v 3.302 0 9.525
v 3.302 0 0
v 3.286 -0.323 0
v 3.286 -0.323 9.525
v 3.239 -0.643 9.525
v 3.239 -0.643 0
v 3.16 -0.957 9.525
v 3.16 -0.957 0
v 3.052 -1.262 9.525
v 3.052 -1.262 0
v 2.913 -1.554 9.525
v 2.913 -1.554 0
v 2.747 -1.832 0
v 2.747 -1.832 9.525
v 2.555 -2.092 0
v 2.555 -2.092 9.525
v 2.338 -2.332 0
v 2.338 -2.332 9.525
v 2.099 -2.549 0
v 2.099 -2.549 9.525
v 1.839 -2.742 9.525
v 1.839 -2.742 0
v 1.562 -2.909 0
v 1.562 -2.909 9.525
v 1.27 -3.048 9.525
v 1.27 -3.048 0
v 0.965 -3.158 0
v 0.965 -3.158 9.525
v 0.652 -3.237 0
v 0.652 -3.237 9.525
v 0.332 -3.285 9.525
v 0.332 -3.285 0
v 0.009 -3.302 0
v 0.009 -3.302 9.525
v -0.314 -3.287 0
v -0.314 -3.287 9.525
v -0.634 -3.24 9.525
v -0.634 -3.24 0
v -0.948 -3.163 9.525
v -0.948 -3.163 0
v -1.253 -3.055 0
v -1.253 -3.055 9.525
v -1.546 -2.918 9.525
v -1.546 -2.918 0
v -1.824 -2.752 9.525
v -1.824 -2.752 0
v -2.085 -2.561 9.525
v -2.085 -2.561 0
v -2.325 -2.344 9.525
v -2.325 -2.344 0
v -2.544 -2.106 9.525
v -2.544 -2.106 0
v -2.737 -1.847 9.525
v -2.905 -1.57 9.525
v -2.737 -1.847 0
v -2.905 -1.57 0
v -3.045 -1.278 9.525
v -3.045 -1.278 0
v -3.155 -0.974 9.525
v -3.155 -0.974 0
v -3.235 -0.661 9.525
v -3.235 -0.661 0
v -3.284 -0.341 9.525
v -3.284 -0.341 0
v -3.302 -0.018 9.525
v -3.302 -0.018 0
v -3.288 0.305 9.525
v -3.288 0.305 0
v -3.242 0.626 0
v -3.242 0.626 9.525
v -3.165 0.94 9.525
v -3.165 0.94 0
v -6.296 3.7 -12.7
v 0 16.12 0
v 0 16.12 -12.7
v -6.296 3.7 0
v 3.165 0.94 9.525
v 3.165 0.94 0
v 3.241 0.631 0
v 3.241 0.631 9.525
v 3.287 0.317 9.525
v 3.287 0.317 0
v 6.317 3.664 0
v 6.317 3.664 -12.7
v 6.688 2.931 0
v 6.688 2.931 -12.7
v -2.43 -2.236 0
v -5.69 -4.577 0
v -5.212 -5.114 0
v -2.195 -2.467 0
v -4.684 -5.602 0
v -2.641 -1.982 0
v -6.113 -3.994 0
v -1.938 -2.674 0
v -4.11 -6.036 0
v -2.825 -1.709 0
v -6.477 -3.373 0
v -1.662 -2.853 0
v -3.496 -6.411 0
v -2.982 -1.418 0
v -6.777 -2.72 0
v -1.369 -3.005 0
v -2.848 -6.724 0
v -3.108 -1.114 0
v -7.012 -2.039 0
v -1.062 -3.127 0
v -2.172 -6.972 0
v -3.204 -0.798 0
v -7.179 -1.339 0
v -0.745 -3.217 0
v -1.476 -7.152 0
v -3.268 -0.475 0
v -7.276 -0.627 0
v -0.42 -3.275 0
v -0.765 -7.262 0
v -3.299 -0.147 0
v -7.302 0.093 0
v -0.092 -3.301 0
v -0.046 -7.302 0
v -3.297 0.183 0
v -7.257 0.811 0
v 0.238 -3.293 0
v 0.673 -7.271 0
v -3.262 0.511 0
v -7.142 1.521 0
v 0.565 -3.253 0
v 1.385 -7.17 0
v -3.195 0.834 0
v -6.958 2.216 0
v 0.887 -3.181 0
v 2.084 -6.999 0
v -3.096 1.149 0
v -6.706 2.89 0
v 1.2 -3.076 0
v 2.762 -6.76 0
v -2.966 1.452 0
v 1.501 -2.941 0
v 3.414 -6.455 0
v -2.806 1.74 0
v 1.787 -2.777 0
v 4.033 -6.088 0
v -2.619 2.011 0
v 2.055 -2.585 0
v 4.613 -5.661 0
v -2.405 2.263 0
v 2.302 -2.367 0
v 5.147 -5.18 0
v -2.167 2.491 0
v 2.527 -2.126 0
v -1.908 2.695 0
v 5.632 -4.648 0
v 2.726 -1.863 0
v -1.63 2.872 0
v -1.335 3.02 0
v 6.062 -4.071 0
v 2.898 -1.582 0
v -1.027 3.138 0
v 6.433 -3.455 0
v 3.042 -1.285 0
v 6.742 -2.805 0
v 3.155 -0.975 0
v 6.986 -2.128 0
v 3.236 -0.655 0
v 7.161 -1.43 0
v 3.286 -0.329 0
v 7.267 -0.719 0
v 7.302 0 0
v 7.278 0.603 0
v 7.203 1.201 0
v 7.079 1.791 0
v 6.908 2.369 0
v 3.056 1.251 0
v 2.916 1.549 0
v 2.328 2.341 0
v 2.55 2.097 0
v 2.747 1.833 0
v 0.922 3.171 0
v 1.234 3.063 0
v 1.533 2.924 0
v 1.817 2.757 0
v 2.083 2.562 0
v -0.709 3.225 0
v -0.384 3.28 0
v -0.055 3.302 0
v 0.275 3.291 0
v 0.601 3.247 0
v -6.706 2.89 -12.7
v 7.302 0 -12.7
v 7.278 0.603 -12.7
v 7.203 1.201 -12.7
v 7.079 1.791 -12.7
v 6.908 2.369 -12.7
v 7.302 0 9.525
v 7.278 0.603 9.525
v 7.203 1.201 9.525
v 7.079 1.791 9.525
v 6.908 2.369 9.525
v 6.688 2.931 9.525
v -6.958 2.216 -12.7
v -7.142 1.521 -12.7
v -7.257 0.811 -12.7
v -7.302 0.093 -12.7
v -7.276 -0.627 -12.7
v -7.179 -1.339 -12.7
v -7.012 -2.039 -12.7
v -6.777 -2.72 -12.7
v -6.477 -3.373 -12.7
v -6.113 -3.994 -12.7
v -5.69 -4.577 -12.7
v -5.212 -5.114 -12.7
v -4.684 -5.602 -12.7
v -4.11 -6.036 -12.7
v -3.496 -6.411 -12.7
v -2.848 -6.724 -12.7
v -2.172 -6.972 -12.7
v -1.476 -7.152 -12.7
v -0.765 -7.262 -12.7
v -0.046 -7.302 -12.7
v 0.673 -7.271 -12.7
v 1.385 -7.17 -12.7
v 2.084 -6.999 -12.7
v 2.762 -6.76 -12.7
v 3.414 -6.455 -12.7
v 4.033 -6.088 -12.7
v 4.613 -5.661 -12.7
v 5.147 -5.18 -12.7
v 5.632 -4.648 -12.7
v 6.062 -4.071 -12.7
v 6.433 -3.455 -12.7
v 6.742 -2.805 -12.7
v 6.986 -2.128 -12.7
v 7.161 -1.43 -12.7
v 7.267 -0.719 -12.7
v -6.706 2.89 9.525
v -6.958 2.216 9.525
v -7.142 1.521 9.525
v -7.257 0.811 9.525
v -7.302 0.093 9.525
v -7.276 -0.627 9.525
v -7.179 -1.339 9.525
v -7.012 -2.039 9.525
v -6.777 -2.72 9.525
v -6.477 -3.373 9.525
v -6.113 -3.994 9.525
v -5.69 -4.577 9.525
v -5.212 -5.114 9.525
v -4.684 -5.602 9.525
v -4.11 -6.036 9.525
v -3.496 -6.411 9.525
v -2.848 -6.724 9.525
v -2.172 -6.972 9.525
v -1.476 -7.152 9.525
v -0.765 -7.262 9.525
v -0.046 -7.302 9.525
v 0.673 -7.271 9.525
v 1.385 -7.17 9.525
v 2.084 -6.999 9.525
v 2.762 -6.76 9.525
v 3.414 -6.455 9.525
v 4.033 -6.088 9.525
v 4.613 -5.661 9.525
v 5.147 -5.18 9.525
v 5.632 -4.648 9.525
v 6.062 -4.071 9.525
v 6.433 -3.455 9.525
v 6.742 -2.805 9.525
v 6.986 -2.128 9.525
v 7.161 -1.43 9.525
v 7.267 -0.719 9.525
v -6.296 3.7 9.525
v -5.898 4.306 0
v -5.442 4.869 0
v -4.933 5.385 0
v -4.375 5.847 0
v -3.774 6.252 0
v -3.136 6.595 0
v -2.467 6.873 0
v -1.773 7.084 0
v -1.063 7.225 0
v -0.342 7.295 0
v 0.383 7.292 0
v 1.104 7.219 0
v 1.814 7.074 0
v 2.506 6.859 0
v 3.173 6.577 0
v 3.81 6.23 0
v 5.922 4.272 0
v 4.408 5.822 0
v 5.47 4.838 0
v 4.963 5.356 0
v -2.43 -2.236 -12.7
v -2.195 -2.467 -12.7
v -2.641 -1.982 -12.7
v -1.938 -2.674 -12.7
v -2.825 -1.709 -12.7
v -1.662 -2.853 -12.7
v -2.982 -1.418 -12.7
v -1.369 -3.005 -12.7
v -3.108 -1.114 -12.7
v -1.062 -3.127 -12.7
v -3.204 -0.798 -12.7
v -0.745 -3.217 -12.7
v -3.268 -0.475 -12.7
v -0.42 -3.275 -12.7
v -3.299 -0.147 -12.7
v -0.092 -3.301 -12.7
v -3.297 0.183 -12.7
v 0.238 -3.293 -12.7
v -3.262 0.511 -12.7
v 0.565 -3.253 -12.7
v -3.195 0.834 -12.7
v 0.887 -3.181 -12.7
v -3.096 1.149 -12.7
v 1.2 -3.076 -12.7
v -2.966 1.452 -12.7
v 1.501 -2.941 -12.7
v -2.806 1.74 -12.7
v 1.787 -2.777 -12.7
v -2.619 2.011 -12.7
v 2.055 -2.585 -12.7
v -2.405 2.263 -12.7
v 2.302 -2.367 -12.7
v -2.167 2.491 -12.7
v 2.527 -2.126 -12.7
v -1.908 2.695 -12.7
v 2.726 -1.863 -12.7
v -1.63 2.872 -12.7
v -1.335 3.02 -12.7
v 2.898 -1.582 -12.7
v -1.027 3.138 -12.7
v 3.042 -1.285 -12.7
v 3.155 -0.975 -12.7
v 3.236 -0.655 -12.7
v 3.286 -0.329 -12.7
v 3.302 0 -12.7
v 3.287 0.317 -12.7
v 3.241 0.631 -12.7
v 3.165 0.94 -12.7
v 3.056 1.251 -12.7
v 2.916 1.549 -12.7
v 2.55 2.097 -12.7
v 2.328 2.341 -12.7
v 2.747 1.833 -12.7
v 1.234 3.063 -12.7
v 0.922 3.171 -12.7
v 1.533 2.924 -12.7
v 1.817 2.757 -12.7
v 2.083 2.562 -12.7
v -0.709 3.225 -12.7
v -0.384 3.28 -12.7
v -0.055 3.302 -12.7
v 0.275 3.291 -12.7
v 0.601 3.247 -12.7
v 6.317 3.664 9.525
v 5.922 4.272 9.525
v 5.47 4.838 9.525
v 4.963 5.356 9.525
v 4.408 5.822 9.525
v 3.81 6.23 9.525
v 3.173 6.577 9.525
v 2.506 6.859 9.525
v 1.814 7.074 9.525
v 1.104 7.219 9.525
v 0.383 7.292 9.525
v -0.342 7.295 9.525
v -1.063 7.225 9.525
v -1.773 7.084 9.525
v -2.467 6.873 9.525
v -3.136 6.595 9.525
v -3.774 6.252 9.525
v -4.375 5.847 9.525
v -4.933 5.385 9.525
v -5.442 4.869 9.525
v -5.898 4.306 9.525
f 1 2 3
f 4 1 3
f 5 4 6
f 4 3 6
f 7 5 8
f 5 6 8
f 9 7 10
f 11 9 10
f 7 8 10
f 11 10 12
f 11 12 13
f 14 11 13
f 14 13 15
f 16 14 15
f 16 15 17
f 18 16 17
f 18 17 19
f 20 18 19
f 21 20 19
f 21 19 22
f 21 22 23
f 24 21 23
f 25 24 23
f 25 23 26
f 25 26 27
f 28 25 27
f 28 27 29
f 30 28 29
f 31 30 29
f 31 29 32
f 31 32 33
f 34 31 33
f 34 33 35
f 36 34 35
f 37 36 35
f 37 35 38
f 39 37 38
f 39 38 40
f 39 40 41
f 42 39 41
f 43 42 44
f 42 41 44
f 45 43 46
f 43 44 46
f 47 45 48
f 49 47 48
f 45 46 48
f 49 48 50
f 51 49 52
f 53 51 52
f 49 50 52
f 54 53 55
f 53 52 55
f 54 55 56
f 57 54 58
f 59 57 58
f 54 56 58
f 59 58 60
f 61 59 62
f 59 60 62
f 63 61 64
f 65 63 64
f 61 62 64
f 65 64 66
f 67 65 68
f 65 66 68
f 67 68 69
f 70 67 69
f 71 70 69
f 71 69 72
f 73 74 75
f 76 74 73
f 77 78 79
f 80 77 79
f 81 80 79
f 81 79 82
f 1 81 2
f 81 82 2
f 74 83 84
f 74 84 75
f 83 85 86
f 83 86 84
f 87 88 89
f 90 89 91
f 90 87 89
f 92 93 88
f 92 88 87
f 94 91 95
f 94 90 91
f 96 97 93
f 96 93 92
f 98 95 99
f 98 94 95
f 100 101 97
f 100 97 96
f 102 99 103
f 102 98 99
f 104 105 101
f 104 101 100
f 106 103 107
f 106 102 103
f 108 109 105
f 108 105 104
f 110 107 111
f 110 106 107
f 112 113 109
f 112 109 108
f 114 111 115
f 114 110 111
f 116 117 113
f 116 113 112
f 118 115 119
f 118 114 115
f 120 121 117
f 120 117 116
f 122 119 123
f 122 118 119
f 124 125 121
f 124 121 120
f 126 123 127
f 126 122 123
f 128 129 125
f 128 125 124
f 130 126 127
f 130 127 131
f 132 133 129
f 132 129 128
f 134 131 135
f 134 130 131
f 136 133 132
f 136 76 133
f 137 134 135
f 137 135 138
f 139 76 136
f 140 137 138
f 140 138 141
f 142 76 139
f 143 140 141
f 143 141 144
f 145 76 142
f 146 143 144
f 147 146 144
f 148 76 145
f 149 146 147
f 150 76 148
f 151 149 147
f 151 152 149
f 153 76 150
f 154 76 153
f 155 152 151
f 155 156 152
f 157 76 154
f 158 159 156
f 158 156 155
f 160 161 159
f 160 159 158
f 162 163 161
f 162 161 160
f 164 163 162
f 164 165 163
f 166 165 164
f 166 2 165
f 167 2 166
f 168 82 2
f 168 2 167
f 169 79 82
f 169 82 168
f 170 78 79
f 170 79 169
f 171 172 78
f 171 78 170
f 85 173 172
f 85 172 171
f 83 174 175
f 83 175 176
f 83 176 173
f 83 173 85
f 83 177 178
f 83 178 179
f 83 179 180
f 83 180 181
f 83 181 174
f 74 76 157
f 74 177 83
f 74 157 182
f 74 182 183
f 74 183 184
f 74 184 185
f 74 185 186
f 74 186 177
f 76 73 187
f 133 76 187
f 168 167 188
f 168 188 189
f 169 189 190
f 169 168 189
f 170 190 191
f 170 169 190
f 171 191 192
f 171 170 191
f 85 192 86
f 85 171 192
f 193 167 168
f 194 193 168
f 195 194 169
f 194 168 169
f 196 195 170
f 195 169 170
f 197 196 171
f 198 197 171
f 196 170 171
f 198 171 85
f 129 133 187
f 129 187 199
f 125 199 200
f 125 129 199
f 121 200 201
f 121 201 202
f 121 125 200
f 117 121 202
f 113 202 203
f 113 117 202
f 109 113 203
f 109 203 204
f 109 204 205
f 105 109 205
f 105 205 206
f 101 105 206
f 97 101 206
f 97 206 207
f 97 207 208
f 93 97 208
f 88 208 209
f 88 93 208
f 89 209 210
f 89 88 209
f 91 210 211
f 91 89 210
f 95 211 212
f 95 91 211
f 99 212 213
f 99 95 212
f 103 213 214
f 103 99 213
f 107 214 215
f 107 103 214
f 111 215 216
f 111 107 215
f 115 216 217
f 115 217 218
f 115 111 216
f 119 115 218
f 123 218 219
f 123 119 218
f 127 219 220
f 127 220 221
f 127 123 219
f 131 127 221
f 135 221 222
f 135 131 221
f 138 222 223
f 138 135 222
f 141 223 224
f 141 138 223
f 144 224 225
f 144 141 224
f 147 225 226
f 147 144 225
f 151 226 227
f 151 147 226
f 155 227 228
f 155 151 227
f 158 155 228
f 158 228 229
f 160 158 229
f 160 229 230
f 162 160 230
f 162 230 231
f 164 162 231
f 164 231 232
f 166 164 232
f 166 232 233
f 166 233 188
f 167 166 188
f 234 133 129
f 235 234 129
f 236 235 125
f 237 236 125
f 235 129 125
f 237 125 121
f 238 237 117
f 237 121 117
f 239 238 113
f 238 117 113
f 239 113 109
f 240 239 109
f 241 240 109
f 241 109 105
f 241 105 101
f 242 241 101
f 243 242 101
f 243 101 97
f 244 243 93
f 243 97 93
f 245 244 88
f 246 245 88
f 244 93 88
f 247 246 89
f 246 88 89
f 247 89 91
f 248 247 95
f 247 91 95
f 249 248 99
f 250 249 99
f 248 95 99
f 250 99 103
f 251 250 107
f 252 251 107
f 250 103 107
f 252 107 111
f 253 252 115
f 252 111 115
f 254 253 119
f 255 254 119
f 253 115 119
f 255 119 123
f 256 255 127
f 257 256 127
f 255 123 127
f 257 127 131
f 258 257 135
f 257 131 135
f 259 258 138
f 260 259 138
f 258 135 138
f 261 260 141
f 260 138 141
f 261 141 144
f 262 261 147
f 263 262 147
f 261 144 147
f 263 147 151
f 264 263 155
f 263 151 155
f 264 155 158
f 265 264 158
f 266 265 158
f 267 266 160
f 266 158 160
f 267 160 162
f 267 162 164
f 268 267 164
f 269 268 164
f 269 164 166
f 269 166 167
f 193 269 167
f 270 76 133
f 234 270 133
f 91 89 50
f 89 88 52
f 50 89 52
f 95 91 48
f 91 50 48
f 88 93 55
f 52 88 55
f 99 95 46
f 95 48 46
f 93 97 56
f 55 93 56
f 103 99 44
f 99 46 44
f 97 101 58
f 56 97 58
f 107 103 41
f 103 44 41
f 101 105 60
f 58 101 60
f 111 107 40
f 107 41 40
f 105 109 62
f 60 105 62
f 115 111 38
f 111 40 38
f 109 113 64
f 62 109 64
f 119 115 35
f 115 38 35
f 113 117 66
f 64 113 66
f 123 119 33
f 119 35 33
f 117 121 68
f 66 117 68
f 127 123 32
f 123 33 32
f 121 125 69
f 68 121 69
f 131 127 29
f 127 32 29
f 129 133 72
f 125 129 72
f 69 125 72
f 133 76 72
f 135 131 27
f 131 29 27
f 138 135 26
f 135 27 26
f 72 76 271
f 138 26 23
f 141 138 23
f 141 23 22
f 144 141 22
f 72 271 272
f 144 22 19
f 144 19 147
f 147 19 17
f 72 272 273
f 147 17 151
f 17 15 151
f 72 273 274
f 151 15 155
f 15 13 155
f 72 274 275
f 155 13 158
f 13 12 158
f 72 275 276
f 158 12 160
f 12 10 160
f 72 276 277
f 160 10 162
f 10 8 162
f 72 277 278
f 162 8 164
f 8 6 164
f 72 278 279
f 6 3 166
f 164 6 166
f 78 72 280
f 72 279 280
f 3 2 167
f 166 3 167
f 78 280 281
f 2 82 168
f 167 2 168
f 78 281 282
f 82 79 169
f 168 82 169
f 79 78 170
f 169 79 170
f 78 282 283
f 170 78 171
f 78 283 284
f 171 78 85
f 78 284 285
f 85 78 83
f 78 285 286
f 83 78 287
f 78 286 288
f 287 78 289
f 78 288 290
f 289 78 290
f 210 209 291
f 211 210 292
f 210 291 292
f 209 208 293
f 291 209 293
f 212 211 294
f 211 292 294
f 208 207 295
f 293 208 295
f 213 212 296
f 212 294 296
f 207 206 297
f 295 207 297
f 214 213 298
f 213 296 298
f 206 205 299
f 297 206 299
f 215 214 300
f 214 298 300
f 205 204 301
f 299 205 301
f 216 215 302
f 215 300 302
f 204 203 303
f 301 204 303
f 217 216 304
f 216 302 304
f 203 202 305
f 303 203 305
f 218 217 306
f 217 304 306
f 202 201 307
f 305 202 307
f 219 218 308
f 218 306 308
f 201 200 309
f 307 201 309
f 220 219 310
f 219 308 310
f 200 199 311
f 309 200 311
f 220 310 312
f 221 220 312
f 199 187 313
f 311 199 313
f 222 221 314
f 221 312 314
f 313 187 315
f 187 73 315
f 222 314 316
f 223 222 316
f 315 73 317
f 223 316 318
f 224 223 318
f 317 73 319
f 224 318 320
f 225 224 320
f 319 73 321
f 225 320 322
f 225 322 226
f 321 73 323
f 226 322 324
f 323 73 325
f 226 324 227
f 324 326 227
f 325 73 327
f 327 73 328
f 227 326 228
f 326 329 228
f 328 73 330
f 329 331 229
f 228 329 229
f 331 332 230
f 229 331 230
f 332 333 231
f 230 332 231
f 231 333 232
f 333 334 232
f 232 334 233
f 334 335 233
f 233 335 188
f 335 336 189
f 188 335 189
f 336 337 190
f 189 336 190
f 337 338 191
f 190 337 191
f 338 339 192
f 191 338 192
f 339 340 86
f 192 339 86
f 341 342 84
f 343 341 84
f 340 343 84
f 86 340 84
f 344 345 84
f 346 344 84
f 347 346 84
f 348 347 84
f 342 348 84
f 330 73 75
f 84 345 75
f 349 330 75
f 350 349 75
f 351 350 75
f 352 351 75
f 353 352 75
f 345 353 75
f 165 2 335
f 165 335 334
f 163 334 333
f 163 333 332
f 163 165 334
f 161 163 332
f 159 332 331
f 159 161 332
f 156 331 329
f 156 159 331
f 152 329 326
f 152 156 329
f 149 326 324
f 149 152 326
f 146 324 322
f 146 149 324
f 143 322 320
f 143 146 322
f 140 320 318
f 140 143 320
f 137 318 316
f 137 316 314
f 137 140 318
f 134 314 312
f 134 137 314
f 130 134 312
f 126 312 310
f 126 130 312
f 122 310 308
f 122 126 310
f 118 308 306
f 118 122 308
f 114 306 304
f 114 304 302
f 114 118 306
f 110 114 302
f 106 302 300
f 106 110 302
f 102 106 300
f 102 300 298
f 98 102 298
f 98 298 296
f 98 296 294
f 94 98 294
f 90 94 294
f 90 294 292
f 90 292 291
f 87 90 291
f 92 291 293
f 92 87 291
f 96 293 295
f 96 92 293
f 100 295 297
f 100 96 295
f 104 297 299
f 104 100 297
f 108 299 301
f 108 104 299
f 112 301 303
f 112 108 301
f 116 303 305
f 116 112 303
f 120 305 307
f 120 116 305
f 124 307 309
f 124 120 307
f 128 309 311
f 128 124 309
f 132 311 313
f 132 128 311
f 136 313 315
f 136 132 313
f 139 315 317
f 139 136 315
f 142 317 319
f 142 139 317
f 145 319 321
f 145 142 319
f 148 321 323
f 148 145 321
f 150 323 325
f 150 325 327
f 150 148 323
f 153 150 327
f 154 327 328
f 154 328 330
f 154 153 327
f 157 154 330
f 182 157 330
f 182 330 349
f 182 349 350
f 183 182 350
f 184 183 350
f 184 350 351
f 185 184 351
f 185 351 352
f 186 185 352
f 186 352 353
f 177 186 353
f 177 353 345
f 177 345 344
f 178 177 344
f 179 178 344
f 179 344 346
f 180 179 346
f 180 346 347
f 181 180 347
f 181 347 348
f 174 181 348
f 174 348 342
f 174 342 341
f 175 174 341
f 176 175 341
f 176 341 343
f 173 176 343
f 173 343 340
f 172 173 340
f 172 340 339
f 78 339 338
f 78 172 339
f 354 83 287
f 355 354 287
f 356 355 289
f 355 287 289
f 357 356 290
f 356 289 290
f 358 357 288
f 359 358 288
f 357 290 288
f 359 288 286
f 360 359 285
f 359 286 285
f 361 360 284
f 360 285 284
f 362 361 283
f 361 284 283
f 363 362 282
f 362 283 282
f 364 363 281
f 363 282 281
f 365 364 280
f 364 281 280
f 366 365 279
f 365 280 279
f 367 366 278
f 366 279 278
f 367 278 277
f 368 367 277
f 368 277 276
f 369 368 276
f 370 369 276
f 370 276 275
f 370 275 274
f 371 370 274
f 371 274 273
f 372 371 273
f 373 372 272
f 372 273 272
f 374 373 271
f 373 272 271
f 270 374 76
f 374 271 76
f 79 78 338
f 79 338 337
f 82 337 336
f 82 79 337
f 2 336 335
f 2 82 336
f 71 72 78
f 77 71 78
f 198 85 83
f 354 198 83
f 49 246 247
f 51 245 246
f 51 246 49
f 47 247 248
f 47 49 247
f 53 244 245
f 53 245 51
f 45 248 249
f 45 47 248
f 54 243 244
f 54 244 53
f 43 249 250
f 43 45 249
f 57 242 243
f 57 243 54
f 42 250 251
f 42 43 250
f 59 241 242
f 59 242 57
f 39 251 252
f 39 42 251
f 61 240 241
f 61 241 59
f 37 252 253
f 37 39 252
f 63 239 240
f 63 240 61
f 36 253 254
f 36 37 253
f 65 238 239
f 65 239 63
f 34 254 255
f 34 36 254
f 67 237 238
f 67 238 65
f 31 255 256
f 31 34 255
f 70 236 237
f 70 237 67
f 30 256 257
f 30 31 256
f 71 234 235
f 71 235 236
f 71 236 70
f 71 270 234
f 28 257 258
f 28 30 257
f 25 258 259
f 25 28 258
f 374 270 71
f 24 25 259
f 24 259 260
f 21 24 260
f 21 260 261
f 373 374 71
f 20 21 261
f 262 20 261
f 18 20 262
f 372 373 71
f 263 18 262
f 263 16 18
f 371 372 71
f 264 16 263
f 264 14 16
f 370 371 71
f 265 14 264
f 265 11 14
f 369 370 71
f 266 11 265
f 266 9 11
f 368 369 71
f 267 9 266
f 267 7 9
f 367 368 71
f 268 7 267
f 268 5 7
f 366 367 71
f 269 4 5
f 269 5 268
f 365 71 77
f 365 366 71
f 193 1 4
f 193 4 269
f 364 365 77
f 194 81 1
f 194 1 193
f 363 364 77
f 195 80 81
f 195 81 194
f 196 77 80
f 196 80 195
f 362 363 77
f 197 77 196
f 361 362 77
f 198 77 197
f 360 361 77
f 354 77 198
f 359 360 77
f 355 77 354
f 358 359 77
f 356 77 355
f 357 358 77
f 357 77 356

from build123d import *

# Parameters (mm, degrees)
F1_DEPTH = 9.525
F2_DEPTH = 12.7
F3_DEPTH = 9.525


# Not quite as in the source:
# - a feature names something its author has since deleted; it is built from what else it names
# - the program builds the solid bodies; features that only make, move or delete a surface that nothing else refers to are left out


with BuildPart() as f1:
    # F0 (on Top) → F1 (new body)
    with BuildSketch(Plane.XY):
        with BuildLine():
            ThreePointArc((-6.7061053414, 2.890442423), (-1.4756645952, -7.1518473315), (7.3025, 0))
            ThreePointArc((7.3025, 0), (7.1473488528, 1.4973011139), (6.6884881888, 2.9309779936))
            Line((6.6884881888, 2.9309779936), (6.3166219962, 3.6642588347))
            ThreePointArc((6.3166219962, 3.6642588347), (0.0208084361, 7.3024703532), (-6.2956369305, 3.7001975474))
            Line((-6.2956369305, 3.7001975474), (-6.7061053414, 2.890442423))
        make_face()
        with BuildLine():
            ThreePointArc((3.1654351928, 0.9398), (3.2676804469, 0.474835231), (3.302, 0))
            ThreePointArc((3.302, 0), (-0.474835231, -3.2676804469), (-3.1654351928, 0.9398))
            ThreePointArc((-3.1654351928, 0.9398), (0, 3.302), (3.1654351928, 0.9398))
        make_face(mode=Mode.SUBTRACT)
    extrude(amount=F1_DEPTH)

    # F0 (on Top) → F3 (join, through all)
    with BuildSketch(Plane.XY):
        with BuildLine():
            Line((-3.1654351928, 0.9398), (3.1654351928, 0.9398))
            ThreePointArc((3.1654351928, 0.9398), (0, 3.302), (-3.1654351928, 0.9398))
        make_face()
    extrude(amount=F3_DEPTH)


with BuildPart() as f2:
    # F0 (on Top) → F2 (new body)
    with BuildSketch(Plane.XY):
        with BuildLine():
            ThreePointArc((-6.7061053414, 2.890442423), (-1.4756645952, -7.1518473315), (7.3025, 0))
            ThreePointArc((7.3025, 0), (7.1473488528, 1.4973011139), (6.6884881888, 2.9309779936))
            Line((6.6884881888, 2.9309779936), (6.3166219962, 3.6642588347))
            ThreePointArc((6.3166219962, 3.6642588347), (0.0208084361, 7.3024703532), (-6.2956369305, 3.7001975474))
            Line((-6.2956369305, 3.7001975474), (-6.7061053414, 2.890442423))
        make_face()
        with BuildLine():
            ThreePointArc((3.1654351928, 0.9398), (3.2676804469, 0.474835231), (3.302, 0))
            ThreePointArc((3.302, 0), (-0.474835231, -3.2676804469), (-3.1654351928, 0.9398))
            ThreePointArc((-3.1654351928, 0.9398), (0, 3.302), (3.1654351928, 0.9398))
        make_face(mode=Mode.SUBTRACT)
        with BuildLine():
            ThreePointArc((-6.2956369305, 3.7001975474), (0.0208084361, 7.3024703532), (6.3166219962, 3.6642588347))
            Line((6.3166219962, 3.6642588347), (0, 16.1199700087))
            Line((0, 16.1199700087), (-6.2956369305, 3.7001975474))
        make_face()
    extrude(amount=-F2_DEPTH)


solid = Compound([f1.part, f2.part])
